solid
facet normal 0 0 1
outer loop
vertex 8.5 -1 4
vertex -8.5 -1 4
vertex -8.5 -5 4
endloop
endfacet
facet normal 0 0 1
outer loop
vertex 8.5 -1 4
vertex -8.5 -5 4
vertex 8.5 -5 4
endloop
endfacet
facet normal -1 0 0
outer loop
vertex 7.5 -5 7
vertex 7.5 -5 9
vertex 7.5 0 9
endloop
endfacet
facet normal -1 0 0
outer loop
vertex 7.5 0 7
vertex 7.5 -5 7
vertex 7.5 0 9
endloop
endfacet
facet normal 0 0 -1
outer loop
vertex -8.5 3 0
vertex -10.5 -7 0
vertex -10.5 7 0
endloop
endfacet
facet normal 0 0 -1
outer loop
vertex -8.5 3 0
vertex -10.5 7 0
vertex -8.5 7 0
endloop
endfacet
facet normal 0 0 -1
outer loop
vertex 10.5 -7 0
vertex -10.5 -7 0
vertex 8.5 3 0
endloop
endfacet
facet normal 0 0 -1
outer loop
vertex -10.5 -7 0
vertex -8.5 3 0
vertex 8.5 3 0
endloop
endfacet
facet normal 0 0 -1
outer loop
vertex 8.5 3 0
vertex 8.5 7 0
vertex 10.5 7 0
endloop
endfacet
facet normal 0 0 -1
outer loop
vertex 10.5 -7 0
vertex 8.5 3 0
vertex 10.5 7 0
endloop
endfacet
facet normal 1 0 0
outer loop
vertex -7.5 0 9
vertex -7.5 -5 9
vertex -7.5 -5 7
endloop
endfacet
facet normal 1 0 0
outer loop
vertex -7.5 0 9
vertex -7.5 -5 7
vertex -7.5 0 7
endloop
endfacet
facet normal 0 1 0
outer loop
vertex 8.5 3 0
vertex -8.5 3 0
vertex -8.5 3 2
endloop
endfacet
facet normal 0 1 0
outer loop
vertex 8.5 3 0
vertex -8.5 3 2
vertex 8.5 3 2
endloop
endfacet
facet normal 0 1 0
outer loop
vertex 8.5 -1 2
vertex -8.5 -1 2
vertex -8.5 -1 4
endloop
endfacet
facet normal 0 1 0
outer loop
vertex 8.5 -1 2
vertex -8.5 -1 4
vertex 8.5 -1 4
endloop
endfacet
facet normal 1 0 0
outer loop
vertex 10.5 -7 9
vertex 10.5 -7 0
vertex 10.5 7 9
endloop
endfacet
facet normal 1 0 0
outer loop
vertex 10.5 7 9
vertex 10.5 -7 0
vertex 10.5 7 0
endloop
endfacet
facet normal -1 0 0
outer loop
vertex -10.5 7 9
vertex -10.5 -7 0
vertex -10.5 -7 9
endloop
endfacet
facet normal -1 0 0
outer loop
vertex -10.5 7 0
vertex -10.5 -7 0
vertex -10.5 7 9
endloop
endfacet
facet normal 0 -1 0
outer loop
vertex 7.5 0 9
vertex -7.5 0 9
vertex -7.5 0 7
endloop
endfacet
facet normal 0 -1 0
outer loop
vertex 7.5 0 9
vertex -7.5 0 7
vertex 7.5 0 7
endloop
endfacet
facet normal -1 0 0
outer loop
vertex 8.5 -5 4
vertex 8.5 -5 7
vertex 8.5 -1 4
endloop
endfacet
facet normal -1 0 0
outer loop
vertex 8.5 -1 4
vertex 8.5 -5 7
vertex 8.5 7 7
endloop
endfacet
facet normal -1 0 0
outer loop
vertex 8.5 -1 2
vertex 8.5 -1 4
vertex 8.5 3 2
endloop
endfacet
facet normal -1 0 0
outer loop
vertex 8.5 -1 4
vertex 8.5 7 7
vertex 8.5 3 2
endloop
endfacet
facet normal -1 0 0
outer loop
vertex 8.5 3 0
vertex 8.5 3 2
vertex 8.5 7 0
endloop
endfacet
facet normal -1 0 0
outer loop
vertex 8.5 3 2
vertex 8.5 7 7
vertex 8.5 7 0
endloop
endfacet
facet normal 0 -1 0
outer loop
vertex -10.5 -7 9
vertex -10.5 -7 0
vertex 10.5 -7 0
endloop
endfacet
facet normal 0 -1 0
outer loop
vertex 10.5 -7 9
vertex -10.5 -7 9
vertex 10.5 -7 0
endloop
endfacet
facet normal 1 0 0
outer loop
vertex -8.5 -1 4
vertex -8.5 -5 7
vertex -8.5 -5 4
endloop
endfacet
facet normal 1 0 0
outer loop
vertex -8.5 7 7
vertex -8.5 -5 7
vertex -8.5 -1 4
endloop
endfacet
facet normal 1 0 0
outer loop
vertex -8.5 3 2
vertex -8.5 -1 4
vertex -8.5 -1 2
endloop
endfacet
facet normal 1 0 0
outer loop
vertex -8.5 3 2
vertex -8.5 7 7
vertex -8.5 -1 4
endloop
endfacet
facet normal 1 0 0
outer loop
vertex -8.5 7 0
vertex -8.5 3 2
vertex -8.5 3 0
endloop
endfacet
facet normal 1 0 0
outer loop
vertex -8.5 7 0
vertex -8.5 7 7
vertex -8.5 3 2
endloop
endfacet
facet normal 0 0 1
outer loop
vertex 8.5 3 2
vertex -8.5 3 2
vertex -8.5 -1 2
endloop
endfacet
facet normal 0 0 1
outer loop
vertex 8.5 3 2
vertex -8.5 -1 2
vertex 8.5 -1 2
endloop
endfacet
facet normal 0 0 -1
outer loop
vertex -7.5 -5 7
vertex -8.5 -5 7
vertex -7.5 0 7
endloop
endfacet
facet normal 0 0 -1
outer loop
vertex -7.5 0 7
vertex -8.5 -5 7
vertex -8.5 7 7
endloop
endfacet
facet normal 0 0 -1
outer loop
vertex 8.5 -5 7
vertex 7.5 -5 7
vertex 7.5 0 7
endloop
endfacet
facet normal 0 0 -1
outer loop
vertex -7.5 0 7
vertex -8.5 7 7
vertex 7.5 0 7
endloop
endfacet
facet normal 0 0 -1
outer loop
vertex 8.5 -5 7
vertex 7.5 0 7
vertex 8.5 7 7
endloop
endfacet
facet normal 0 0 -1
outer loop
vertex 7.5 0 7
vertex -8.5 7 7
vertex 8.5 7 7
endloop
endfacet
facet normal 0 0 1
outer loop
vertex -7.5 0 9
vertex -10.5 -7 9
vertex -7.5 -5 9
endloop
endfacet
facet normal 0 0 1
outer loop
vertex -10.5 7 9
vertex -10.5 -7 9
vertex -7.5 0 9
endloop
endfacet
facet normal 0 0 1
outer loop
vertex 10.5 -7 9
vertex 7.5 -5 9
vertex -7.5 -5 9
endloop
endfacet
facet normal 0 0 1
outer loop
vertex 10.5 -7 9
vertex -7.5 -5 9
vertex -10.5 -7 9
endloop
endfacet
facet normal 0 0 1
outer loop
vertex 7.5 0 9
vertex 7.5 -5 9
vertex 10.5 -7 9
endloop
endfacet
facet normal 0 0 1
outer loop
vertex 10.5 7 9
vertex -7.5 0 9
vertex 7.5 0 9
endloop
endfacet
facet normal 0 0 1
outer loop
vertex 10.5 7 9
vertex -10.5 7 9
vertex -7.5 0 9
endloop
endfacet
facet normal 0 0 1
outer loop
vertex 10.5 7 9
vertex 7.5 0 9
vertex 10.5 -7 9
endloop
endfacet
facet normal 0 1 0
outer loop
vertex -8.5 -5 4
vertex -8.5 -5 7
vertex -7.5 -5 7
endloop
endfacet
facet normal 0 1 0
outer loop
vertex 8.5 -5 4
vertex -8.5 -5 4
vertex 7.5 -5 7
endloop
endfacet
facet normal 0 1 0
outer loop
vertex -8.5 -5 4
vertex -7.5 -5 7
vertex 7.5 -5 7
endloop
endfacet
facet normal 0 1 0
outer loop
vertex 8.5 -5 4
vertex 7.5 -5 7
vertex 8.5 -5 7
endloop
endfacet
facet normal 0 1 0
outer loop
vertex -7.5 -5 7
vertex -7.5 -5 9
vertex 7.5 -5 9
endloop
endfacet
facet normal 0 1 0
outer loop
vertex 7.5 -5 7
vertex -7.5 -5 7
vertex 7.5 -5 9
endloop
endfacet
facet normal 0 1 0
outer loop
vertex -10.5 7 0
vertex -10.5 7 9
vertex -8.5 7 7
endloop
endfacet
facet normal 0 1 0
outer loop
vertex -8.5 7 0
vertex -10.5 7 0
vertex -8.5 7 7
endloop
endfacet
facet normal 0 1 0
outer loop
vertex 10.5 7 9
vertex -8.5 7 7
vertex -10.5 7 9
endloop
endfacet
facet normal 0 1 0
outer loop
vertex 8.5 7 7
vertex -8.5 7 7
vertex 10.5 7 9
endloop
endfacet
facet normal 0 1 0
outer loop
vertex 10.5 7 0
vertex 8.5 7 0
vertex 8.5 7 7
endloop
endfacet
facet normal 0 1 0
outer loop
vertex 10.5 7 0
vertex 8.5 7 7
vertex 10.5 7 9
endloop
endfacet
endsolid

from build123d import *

# Parameters (mm, degrees)
SKETCH2_W           = 21
SKETCH2_H           = 14
BOSS_EXTRUDE1_DEPTH = 9
SKETCH3_W           = 15
SKETCH3_H           = 5
CUT_EXTRUDE1_DEPTH  = 5
SKETCH6_W           = 17
SKETCH6_H           = 7
CUT_EXTRUDE3_DEPTH  = 4
SKETCH7_W           = 17
SKETCH7_H           = 5
CUT_EXTRUDE4_DEPTH  = 4
SKETCH8_W           = 1
SKETCH8_H           = 3
CUT_EXTRUDE6_DEPTH  = 4


with BuildPart() as part:
    # Sketch2 → Boss-Extrude1 (new body)
    with BuildSketch(Plane.XY):
        Rectangle(SKETCH2_W, SKETCH2_H)
    extrude(amount=BOSS_EXTRUDE1_DEPTH)

    # Sketch3 → Cut-Extrude1 (cut)
    with BuildSketch(Plane.XY.offset(9)):
        with Locations((0, -2.5)):
            Rectangle(SKETCH3_W, SKETCH3_H)
    extrude(amount=-CUT_EXTRUDE1_DEPTH, mode=Mode.SUBTRACT)

    # Sketch6 → Cut-Extrude3 (cut)
    with BuildSketch(Plane(origin=(0, 7, 0), x_dir=(1, 0, 0), z_dir=(0, 1, 0))):
        with Locations((0, -3.5)):
            Rectangle(SKETCH6_W, SKETCH6_H)
    extrude(amount=-CUT_EXTRUDE3_DEPTH, mode=Mode.SUBTRACT)

    # Sketch7 → Cut-Extrude4 (cut)
    with BuildSketch(Plane(origin=(0, 3, 0), x_dir=(1, 0, 0), z_dir=(0, 1, 0))):
        with Locations((0, -4.5)):
            Rectangle(SKETCH7_W, SKETCH7_H)
    extrude(amount=-CUT_EXTRUDE4_DEPTH, mode=Mode.SUBTRACT)

    # Sketch8 → Cut-Extrude6 (cut)
    with BuildSketch(Plane(origin=(0, -1, 0), x_dir=(1, 0, 0), z_dir=(0, 1, 0))):
        with Locations((-8, -5.5)):
            Rectangle(SKETCH8_W, SKETCH8_H)
        with Locations((8, -5.5)):
            Rectangle(SKETCH8_W, SKETCH8_H)
    extrude(amount=-CUT_EXTRUDE6_DEPTH, mode=Mode.SUBTRACT)


solid = part.part
